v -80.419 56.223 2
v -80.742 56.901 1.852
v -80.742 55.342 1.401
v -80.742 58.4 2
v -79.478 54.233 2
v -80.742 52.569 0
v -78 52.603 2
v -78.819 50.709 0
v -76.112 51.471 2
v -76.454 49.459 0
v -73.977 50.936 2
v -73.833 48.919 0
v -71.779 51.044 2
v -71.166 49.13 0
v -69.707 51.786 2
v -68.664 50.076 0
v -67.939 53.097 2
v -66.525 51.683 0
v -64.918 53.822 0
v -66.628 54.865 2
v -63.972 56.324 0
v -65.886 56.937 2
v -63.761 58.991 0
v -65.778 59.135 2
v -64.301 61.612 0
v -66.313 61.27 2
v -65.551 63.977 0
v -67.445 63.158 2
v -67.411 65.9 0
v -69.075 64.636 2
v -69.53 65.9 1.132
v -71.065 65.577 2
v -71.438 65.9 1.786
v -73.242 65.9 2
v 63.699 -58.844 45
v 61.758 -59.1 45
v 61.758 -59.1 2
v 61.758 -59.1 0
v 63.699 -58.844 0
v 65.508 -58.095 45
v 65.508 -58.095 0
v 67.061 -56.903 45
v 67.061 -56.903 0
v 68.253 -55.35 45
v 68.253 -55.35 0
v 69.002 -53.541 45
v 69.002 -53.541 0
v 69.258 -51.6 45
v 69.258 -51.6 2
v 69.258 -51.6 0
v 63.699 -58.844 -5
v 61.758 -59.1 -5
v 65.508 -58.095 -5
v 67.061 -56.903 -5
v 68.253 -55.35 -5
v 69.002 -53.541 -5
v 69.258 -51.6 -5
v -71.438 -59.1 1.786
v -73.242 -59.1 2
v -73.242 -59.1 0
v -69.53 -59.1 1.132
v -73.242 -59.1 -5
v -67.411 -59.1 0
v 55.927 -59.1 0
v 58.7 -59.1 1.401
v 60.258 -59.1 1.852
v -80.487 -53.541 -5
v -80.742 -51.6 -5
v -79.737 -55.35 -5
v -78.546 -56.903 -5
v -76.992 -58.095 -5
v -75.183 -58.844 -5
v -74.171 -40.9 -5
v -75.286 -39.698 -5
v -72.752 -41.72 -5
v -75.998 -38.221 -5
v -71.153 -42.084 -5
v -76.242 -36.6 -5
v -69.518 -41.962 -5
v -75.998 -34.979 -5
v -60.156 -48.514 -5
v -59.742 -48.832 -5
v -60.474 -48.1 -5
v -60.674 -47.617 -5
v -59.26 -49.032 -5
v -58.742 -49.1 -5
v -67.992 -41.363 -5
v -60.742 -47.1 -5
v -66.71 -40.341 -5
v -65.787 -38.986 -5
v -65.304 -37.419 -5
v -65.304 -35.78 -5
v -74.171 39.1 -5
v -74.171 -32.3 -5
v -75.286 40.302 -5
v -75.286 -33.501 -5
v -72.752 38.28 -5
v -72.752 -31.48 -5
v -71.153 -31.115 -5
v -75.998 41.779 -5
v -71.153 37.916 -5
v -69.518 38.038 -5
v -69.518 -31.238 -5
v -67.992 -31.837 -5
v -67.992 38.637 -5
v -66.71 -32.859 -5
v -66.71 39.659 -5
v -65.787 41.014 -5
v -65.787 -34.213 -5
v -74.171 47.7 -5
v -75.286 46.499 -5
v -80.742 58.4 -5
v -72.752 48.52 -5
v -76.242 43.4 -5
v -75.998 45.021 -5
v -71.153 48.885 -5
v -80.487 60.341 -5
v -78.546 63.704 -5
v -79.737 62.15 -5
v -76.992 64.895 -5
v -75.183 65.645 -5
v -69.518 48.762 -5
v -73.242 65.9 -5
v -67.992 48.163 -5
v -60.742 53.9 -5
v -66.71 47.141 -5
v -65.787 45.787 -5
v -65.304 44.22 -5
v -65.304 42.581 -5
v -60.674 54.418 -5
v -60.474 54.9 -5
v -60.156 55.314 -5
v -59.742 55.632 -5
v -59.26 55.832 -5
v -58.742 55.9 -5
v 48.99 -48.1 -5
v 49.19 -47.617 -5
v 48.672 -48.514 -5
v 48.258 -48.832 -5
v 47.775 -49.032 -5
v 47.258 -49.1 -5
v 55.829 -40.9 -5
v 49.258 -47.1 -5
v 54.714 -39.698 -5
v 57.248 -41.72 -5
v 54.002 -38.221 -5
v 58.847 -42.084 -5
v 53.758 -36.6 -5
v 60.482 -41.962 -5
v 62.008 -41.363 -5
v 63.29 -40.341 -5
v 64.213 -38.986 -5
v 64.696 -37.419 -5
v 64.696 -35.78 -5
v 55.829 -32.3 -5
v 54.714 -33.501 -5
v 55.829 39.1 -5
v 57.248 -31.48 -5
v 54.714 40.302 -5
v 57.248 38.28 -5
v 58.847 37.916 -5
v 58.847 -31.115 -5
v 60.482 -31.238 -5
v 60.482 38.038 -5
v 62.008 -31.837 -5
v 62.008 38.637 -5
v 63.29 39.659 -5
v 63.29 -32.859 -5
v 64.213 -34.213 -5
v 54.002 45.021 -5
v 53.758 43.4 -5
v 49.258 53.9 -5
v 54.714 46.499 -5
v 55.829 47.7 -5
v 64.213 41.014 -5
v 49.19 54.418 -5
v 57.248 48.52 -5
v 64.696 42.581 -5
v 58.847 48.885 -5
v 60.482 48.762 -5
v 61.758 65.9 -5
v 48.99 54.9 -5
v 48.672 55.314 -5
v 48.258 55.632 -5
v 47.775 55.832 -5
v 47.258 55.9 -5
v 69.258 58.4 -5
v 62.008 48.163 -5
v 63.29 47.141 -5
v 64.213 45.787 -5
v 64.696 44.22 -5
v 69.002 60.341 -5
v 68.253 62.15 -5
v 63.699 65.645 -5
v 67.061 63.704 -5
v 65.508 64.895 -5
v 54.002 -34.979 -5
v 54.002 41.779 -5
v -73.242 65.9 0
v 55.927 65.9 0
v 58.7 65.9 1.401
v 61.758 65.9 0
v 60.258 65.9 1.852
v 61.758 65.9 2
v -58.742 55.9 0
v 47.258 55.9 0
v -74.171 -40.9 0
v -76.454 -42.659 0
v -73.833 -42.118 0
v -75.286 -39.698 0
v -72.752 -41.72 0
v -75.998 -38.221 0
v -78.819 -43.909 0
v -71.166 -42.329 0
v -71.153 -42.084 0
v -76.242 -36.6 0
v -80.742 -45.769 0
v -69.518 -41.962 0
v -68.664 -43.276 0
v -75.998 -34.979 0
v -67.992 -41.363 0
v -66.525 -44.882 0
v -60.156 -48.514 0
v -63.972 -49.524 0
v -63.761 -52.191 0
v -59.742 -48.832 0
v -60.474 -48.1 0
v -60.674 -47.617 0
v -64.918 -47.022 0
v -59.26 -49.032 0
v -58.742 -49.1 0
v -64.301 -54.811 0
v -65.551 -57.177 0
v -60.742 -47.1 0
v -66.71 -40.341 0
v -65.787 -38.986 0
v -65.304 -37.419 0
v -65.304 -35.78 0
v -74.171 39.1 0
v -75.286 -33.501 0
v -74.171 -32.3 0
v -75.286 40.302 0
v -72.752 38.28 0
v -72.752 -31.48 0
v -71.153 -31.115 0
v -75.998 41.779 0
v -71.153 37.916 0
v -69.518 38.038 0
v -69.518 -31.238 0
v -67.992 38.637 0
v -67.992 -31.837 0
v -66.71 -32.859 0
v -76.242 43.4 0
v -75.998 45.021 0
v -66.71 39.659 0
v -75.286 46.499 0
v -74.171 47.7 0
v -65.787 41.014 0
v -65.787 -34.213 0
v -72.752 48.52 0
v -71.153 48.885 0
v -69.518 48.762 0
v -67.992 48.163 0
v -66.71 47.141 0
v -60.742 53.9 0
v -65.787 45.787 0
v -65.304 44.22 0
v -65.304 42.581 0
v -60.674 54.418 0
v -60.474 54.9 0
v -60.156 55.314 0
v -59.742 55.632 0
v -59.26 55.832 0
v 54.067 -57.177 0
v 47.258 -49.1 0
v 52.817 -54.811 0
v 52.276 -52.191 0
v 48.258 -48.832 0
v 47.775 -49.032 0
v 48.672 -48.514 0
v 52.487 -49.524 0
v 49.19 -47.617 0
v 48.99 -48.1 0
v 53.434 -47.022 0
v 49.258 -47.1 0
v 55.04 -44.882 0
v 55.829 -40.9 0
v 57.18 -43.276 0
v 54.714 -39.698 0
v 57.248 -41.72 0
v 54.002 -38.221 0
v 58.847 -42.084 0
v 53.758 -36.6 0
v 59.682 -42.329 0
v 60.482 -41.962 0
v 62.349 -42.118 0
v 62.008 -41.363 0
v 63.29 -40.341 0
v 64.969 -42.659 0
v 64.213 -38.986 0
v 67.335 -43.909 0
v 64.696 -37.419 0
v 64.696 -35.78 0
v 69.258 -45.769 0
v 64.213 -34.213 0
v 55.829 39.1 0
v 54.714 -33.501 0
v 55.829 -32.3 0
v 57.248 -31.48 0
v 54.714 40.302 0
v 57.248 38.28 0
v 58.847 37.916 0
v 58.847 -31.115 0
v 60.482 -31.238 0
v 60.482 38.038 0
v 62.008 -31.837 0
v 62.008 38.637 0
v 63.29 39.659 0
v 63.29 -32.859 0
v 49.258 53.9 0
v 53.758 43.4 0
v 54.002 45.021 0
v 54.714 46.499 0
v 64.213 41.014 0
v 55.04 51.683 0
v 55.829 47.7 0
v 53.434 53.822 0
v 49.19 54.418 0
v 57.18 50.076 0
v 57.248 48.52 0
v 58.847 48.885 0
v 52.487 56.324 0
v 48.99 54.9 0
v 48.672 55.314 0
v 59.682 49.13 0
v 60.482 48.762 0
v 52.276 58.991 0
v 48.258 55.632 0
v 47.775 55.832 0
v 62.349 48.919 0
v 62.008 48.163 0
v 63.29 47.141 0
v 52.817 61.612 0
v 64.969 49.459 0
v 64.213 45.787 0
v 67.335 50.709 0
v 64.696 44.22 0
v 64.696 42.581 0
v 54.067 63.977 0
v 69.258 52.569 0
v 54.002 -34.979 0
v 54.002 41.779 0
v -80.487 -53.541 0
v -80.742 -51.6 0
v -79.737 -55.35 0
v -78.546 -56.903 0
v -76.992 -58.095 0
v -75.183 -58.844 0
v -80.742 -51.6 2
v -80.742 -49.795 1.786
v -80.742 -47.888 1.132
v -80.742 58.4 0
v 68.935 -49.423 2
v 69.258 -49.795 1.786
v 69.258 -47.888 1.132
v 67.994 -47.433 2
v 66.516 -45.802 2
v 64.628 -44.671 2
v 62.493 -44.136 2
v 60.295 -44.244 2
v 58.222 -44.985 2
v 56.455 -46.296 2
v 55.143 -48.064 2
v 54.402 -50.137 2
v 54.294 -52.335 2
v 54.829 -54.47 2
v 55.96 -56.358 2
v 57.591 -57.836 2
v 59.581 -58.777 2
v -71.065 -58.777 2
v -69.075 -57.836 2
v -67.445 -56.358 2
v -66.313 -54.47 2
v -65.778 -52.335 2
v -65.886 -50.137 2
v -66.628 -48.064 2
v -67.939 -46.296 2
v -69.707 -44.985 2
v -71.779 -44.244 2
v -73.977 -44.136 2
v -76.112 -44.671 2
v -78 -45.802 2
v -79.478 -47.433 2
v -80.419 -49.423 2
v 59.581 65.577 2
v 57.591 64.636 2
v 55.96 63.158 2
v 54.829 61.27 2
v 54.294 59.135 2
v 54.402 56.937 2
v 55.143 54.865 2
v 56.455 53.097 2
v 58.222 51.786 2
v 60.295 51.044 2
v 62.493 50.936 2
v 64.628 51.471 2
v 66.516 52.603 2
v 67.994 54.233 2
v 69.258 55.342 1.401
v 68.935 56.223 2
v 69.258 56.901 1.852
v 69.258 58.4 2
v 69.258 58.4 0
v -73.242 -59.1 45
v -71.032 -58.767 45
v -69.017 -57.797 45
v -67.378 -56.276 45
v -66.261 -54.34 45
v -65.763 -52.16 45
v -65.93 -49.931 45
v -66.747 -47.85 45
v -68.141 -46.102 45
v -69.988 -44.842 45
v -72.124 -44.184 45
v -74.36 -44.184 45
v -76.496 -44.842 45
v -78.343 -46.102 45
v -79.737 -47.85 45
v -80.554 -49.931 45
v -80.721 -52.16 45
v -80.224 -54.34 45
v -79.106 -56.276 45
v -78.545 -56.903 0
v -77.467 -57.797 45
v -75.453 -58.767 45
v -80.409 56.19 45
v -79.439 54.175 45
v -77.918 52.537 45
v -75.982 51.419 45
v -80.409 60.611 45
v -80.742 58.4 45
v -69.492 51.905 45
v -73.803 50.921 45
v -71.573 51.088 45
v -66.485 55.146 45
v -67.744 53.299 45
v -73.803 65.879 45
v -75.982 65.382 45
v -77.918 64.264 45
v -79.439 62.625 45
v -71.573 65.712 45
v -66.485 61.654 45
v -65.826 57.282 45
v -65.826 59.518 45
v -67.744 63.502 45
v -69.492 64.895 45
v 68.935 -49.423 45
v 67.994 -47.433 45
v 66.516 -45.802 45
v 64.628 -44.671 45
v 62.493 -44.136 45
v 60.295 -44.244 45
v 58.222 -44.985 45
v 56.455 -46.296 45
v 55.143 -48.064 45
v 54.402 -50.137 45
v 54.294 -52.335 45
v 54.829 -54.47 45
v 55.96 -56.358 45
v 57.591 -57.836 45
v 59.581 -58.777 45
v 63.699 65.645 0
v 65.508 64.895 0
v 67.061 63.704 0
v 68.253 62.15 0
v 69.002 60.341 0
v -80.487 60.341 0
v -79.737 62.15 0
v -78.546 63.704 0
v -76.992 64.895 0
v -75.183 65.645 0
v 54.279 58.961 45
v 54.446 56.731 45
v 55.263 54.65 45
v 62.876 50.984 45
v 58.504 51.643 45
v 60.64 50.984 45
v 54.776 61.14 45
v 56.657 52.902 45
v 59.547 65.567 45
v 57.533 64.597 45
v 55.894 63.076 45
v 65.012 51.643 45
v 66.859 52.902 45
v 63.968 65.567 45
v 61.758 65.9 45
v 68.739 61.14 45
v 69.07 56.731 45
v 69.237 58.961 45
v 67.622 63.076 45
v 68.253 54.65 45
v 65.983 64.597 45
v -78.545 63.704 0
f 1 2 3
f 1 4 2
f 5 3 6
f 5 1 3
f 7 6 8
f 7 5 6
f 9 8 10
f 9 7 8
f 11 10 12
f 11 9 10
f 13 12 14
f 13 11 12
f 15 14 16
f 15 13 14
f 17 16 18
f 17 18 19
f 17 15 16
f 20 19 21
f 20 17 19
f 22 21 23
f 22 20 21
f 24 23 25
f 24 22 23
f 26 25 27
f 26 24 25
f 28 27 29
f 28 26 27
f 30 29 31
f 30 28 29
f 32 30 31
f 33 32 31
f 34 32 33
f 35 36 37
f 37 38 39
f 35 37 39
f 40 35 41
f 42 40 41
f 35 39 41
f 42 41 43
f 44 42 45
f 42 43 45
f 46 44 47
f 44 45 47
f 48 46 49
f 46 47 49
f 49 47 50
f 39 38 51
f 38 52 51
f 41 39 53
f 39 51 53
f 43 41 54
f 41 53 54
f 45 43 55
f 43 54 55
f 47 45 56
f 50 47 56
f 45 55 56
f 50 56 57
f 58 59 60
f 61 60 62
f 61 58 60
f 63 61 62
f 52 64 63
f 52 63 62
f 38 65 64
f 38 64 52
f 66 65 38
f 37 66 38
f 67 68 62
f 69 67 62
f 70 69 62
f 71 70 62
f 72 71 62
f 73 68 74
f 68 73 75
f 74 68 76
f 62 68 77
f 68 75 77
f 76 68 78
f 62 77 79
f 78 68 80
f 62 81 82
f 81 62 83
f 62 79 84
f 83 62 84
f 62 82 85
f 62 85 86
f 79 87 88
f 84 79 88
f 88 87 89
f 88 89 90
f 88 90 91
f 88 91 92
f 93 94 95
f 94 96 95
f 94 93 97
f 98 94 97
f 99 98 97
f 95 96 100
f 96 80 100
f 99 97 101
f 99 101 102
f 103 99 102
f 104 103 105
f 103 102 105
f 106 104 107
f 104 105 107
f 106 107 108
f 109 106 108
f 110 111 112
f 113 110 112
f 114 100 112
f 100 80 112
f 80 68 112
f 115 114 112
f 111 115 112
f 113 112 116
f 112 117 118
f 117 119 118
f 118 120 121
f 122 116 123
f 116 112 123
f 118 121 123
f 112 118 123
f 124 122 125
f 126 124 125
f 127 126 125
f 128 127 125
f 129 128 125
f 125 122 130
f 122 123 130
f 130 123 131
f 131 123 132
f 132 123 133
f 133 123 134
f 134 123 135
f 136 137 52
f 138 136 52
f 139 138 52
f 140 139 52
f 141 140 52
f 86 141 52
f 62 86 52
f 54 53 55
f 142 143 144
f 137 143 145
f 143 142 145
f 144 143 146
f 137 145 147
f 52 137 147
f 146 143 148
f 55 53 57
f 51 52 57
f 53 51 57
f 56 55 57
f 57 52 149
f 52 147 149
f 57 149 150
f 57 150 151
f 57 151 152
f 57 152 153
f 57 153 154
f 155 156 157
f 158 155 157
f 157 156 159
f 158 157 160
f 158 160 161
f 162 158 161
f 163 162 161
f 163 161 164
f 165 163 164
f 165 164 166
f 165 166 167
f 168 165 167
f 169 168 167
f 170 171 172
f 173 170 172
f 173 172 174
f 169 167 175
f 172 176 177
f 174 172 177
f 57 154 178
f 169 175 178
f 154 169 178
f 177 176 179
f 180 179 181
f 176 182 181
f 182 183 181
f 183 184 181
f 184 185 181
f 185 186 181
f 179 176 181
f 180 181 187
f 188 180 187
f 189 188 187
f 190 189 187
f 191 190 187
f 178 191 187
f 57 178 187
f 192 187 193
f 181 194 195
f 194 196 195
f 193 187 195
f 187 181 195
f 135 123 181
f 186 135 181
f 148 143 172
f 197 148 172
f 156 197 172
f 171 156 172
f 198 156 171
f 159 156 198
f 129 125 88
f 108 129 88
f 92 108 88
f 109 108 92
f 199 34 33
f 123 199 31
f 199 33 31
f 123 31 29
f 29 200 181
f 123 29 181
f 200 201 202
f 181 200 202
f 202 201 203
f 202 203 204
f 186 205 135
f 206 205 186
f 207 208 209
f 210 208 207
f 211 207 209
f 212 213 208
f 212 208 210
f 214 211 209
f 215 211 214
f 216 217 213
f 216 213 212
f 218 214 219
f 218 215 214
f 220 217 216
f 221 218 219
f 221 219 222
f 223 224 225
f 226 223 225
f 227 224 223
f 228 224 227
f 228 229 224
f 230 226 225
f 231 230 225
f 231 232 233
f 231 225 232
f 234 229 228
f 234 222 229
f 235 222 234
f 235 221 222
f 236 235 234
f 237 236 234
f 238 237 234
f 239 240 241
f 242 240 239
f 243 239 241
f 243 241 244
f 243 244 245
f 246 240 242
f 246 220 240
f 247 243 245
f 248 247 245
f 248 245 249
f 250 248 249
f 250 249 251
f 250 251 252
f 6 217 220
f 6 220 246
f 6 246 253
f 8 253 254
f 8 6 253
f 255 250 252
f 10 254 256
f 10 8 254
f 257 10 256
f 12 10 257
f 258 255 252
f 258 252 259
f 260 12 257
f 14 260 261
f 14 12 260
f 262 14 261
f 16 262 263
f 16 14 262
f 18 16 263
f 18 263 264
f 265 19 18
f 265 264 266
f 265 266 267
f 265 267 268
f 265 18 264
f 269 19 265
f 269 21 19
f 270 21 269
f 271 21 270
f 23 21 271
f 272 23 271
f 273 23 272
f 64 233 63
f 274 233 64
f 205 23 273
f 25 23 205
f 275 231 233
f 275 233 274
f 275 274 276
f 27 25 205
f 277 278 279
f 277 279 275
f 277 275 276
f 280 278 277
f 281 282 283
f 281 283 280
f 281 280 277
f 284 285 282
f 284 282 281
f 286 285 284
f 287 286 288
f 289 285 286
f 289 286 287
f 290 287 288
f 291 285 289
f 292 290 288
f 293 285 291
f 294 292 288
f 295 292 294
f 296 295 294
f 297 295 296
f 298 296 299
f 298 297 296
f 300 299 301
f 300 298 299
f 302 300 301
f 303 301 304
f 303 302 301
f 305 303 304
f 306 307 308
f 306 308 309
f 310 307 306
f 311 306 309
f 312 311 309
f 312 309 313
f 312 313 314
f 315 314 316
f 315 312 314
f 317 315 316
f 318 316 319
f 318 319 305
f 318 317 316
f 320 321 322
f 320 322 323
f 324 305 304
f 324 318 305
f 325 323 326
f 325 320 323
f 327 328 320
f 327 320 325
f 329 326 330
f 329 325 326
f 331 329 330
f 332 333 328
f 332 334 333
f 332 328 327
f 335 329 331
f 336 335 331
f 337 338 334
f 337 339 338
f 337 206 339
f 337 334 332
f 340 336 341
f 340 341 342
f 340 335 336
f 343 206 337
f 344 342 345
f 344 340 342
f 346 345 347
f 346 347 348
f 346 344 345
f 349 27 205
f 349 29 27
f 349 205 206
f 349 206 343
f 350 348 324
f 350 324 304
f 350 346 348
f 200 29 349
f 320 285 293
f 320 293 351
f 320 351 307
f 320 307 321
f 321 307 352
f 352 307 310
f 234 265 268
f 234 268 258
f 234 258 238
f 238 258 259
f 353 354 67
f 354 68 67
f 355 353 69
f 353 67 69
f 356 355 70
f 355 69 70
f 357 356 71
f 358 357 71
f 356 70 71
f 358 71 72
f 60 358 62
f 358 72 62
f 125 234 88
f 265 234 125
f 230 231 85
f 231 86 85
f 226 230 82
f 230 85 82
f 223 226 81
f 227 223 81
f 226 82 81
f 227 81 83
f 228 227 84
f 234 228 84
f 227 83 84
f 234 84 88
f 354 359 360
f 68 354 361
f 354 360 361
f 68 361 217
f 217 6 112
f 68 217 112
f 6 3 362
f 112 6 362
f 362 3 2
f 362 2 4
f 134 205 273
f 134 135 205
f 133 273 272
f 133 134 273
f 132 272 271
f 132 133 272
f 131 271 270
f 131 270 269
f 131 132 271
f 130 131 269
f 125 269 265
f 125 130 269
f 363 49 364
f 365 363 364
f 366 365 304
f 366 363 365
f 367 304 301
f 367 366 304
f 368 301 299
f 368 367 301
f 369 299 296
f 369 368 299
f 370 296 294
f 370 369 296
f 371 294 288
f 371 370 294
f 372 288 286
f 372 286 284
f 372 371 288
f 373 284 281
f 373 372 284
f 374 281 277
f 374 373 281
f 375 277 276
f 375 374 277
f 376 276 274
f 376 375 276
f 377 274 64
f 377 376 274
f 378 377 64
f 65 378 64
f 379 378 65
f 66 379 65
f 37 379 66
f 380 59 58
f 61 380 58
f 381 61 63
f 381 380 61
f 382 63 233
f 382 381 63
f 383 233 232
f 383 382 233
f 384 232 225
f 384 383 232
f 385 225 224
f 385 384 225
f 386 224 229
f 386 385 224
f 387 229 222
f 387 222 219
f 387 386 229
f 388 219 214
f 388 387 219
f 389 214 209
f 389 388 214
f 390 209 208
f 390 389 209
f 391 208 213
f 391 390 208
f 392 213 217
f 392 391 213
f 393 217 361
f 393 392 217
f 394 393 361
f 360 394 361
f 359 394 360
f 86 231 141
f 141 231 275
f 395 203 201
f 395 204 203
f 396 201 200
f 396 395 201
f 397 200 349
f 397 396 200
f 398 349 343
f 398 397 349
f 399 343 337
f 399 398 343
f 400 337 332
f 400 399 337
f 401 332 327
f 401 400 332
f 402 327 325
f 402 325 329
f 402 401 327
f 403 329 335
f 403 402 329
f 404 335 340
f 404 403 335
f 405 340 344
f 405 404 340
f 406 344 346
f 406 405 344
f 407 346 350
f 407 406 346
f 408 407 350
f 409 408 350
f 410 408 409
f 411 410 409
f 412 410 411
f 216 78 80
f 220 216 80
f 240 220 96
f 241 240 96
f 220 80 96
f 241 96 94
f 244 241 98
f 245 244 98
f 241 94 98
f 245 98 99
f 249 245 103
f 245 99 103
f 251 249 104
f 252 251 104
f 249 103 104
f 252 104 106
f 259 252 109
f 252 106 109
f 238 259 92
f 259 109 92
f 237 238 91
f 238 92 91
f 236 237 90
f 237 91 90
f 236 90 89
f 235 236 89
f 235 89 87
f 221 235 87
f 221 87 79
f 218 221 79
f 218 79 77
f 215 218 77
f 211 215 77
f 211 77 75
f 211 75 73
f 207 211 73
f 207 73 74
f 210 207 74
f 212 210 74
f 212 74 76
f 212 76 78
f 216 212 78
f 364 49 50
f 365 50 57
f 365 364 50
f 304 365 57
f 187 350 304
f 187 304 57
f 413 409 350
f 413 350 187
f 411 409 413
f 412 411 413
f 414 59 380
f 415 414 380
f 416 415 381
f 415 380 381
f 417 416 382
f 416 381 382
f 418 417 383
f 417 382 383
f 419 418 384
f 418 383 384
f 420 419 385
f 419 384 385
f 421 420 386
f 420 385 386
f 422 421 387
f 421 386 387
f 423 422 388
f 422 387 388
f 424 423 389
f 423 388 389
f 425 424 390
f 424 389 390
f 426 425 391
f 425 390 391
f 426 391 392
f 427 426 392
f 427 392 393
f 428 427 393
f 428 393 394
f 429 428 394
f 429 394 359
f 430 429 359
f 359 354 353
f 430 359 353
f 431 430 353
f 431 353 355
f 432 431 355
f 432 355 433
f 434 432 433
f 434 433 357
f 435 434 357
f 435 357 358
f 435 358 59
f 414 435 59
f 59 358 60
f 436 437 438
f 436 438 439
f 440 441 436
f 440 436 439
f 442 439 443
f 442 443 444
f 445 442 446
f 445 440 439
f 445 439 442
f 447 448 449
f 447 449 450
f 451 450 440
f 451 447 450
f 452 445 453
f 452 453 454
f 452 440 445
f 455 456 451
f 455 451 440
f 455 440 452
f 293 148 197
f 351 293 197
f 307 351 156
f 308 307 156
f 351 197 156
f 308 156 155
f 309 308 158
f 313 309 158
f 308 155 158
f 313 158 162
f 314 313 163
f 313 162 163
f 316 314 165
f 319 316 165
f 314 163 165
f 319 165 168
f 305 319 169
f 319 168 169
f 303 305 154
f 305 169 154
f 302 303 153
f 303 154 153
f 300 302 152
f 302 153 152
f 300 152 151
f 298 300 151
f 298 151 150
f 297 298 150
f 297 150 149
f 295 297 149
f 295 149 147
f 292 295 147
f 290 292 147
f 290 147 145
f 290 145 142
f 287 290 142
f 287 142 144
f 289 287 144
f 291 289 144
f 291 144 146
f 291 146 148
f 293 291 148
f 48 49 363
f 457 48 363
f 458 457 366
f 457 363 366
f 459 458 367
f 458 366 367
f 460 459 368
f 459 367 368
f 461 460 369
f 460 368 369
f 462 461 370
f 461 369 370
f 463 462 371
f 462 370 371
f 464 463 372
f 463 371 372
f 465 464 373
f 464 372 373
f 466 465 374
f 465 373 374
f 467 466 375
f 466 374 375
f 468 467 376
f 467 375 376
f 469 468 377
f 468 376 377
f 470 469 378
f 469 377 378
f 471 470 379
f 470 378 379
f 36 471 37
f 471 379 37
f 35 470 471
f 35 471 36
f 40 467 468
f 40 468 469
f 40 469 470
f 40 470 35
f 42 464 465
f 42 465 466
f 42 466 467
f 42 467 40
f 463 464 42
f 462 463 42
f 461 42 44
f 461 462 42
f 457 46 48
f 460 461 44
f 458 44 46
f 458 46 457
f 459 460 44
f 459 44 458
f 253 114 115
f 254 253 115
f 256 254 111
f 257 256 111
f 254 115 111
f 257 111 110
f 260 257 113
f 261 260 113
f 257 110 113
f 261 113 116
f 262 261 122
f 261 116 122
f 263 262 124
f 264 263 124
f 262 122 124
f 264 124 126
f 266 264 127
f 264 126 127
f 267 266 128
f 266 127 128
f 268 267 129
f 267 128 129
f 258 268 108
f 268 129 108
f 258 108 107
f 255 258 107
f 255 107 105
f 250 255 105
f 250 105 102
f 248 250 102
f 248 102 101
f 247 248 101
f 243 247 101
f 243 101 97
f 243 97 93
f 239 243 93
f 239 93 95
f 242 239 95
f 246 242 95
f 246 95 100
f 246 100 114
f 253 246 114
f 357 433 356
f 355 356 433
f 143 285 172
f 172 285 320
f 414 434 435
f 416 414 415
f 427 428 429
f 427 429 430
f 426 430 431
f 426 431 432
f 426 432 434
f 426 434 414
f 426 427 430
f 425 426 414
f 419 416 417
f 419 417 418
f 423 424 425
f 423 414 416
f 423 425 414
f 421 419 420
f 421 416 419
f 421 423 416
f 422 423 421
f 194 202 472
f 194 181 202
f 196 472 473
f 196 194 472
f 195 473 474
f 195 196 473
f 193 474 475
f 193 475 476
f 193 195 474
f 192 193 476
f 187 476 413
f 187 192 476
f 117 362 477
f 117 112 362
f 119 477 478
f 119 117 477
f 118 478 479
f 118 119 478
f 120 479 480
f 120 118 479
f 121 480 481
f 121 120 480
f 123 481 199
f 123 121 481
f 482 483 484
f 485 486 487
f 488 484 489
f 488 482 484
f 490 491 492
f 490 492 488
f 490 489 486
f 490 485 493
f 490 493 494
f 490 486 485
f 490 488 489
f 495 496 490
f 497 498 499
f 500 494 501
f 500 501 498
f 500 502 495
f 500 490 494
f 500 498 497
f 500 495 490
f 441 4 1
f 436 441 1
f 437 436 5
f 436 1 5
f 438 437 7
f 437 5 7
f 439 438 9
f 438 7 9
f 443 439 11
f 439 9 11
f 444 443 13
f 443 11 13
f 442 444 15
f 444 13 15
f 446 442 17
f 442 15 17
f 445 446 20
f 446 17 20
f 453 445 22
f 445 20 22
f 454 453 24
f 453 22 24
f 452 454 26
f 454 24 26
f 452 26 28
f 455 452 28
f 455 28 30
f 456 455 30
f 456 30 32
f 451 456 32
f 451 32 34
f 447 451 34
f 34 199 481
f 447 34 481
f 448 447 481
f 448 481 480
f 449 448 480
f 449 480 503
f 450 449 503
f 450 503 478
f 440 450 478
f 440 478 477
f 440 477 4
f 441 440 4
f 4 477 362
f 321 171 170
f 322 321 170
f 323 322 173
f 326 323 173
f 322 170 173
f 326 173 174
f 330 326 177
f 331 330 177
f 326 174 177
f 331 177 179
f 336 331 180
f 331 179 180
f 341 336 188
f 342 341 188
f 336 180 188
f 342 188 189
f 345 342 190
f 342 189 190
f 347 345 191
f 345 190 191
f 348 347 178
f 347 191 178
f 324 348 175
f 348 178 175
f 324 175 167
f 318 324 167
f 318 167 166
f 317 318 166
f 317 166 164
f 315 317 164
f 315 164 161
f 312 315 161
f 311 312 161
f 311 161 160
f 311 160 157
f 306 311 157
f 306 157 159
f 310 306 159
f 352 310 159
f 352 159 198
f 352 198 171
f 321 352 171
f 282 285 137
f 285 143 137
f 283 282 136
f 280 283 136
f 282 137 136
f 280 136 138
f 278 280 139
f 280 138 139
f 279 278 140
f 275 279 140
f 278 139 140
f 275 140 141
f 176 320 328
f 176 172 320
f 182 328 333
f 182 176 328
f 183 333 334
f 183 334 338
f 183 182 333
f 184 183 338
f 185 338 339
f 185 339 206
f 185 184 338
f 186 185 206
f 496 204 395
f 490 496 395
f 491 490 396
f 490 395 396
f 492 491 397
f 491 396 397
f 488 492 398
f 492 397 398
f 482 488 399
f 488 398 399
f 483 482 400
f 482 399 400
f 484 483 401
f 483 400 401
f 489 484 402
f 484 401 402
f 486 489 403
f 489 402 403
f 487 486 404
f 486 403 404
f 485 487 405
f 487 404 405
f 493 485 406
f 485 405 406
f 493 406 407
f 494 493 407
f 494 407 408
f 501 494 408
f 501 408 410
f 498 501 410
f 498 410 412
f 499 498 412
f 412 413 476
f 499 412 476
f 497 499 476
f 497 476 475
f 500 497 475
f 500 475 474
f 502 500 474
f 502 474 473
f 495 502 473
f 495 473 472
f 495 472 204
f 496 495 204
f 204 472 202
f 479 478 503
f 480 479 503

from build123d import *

# Parameters (mm, degrees)
F0_W         = 110
F0_H         = 105
F1_DEPTH     = 5
F2_DEPTH     = 45
F3_D         = 11
F4_R         = 7.4999
F5_R         = 2
F6_T4_ANGLE  = 270.0000001091
F6_T10_ANGLE = 270
F6_T16_ANGLE = 269.9999994391
F6_T22_ANGLE = 270


# Not quite as in the source:
# - a fillet or chamfer that OpenCascade refuses, or shapes differently, is made with other operations: its cross-section is extruded or revolved along the edge and cut away or added
# - a fillet or chamfer is up to 0.001 mm smaller than in the source, because OpenCascade refuses the exact size


with BuildPart() as f1:
    # F0 (on Top) → F1 (new body)
    with BuildSketch(Plane.XY):
        with BuildLine():
            Line((-73.2421757894, 65.9002404553), (-80.7421757894, 65.9002404553))
            Line((-80.7421757894, 65.9002404553), (-80.7421757894, 58.4002404553))
            ThreePointArc((-80.7421757894, 58.4002404553), (-78.5454766483, 63.7035413142), (-73.2421757894, 65.9002404553))
        make_face()
        with BuildLine():
            Line((61.7578242249, 65.9002404553), (-73.2421757894, 65.9002404553))
            ThreePointArc((-73.2421757894, 65.9002404553), (-67.9388749305, 63.7035413142), (-65.7421757894, 58.4002404553))
            ThreePointArc((-65.7421757894, 58.4002404553), (-73.2421757894, 50.9002404553), (-80.7421757894, 58.4002404553))
            Line((-80.7421757894, 58.4002404553), (-80.7421757894, -51.5997595447))
            ThreePointArc((-80.7421757894, -51.5997595447), (-73.2421757894, -44.0997595447), (-65.7421757894, -51.5997595447))
            ThreePointArc((-65.7421757894, -51.5997595447), (-67.9388749305, -56.9030604036), (-73.2421757894, -59.0997595447))
            Line((-73.2421757894, -59.0997595447), (61.757824248, -59.0997595447))
            ThreePointArc((61.757824248, -59.0997595447), (56.4545233385, -46.296458699), (69.2578242106, -51.5997595447))
            Line((69.2578242106, -51.5997595447), (69.2578242106, 58.4002404553))
            ThreePointArc((69.2578242106, 58.4002404553), (56.4545233466, 53.0969396015), (61.7578242249, 65.9002404553))
        make_face()
        with Locations((-5.7421757894, 3.4002404553)):
            Rectangle(F0_W, F0_H, mode=Mode.SUBTRACT)
        with BuildLine():
            Line((69.2578242106, 65.9002404553), (61.7578242249, 65.9002404553))
            ThreePointArc((61.7578242249, 65.9002404553), (67.0611250745, 63.7035413092), (69.2578242106, 58.4002404553))
            Line((69.2578242106, 58.4002404553), (69.2578242106, 65.9002404553))
        make_face()
        with BuildLine():
            ThreePointArc((61.757824248, -59.0997595447), (67.0611250827, -56.9030603903), (69.2578242106, -51.5997595447))
            ThreePointArc((69.2578242106, -51.5997595447), (56.4545233385, -46.296458699), (61.757824248, -59.0997595447))
        make_face()
        with BuildLine():
            ThreePointArc((-65.7421757894, -51.5997595447), (-73.2421757894, -44.0997595447), (-80.7421757894, -51.5997595447))
            ThreePointArc((-80.7421757894, -51.5997595447), (-78.5454766483, -56.9030604036), (-73.2421757894, -59.0997595447))
            ThreePointArc((-73.2421757894, -59.0997595447), (-67.9388749305, -56.9030604036), (-65.7421757894, -51.5997595447))
        make_face()
        with BuildLine():
            ThreePointArc((69.2578242106, 58.4002404553), (67.0611250745, 63.7035413092), (61.7578242249, 65.9002404553))
            ThreePointArc((61.7578242249, 65.9002404553), (56.4545233466, 53.0969396015), (69.2578242106, 58.4002404553))
        make_face()
        with BuildLine():
            ThreePointArc((-65.7421757894, 58.4002404553), (-67.9388749305, 63.7035413142), (-73.2421757894, 65.9002404553))
            ThreePointArc((-73.2421757894, 65.9002404553), (-78.5454766483, 63.7035413142), (-80.7421757894, 58.4002404553))
            ThreePointArc((-80.7421757894, 58.4002404553), (-73.2421757894, 50.9002404553), (-65.7421757894, 58.4002404553))
        make_face()
        with BuildLine():
            ThreePointArc((-73.2421757894, -59.0997595447), (-78.5454766483, -56.9030604036), (-80.7421757894, -51.5997595447))
            Line((-80.7421757894, -51.5997595447), (-80.7421757894, -59.0997595447))
            Line((-80.7421757894, -59.0997595447), (-73.2421757894, -59.0997595447))
        make_face()
        with BuildLine():
            Line((69.2578242106, -59.0997595447), (69.2578242106, -51.5997595447))
            ThreePointArc((69.2578242106, -51.5997595447), (67.0611250827, -56.9030603903), (61.757824248, -59.0997595447))
            Line((61.757824248, -59.0997595447), (69.2578242106, -59.0997595447))
        make_face()
    extrude(amount=-F1_DEPTH)

    # F0 (on Top) → F2 (join)
    with BuildSketch(Plane.XY):
        with BuildLine():
            ThreePointArc((61.757824248, -59.0997595447), (67.0611250827, -56.9030603903), (69.2578242106, -51.5997595447))
            ThreePointArc((69.2578242106, -51.5997595447), (56.4545233385, -46.296458699), (61.757824248, -59.0997595447))
        make_face()
        with BuildLine():
            ThreePointArc((69.2578242106, 58.4002404553), (67.0611250745, 63.7035413092), (61.7578242249, 65.9002404553))
            ThreePointArc((61.7578242249, 65.9002404553), (56.4545233466, 53.0969396015), (69.2578242106, 58.4002404553))
        make_face()
        with BuildLine():
            ThreePointArc((-65.7421757894, -51.5997595447), (-73.2421757894, -44.0997595447), (-80.7421757894, -51.5997595447))
            ThreePointArc((-80.7421757894, -51.5997595447), (-78.5454766483, -56.9030604036), (-73.2421757894, -59.0997595447))
            ThreePointArc((-73.2421757894, -59.0997595447), (-67.9388749305, -56.9030604036), (-65.7421757894, -51.5997595447))
        make_face()
        with BuildLine():
            ThreePointArc((-65.7421757894, 58.4002404553), (-67.9388749305, 63.7035413142), (-73.2421757894, 65.9002404553))
            ThreePointArc((-73.2421757894, 65.9002404553), (-78.5454766483, 63.7035413142), (-80.7421757894, 58.4002404553))
            ThreePointArc((-80.7421757894, 58.4002404553), (-73.2421757894, 50.9002404553), (-65.7421757894, 58.4002404553))
        make_face()
    extrude(amount=F2_DEPTH)

    # F3 (through all)
    with Locations(Plane.XY):
        with Locations((-70.7421757894, 43.4002404553), (-70.7421757894, -36.5997595447), (59.2578242106, 43.4002404553), (59.2578242106, -36.5997595447)):
            Hole(F3_D / 2)

    # F4 (radius 7.5 in the source; OpenCascade refuses exactly that, so slightly less here)
    f4_edges = [f1.edges().sort_by_distance(p)[0] for p in [
        (69.257824, 65.90024, -2.5),
        (69.257824, -59.09976, -2.5),
        (-80.742176, -59.09976, -2.5),
        (-80.742176, 65.90024, -2.5),
    ]]
    fillet(f4_edges, radius=F4_R)

    # F5
    f5_edges = [f1.edges().sort_by_distance(p)[0] for p in [
        (-60.742176, 55.90024, -2.5),
        (49.257824, 55.90024, -2.5),
        (-60.742176, -49.09976, -2.5),
        (49.257824, -49.09976, -2.5),
    ]]
    fillet(f5_edges, radius=F5_R)

    # F6: chamfer of 2 on 4 edges, made by hand


with BuildPart() as f6_tool2:
    # F6_s3 → F6_t4 (revolve)
    with BuildSketch(Plane.YZ.offset(61.7578242106)):
        Polygon((67.9002404553, 0), (65.9002404553, 2), (65.9002404553, 0), align=None)
    revolve(axis=Axis((61.7578242106, 58.4002404553, 0), (0, 0, 1)), revolution_arc=F6_T4_ANGLE)

    split(bisect_by=Plane.XZ.offset(-65.9002404553), keep=Keep.TOP)

    split(bisect_by=Plane.YZ.offset(69.2578242106), keep=Keep.BOTTOM)


with BuildPart() as f1_1:
    add(f1.part)

    # F6_t1: union F6_tool2
    add(f6_tool2.part)


with BuildPart() as f6_tool8:
    # F6_s9 → F6_t10 (revolve)
    with BuildSketch(Plane.XZ.offset(-58.4002404553)):
        Polygon((-82.7421757894, 0), (-80.7421757894, 2), (-80.7421757894, 0), align=None)
    revolve(axis=Axis((-73.2421757894, 58.4002404553, 0), (0, 0, 1)), revolution_arc=F6_T10_ANGLE)

    split(bisect_by=Plane.YZ.offset(-80.7421757894), keep=Keep.TOP)

    split(bisect_by=Plane.XZ.offset(-65.9002404553), keep=Keep.TOP)


with BuildPart() as f1_2:
    add(f1_1.part)

    # F6_t7: union F6_tool8
    add(f6_tool8.part)


with BuildPart() as f6_tool14:
    # F6_s15 → F6_t16 (revolve)
    with BuildSketch(Plane.XZ.offset(51.5997595447)):
        Polygon((71.2578242106, 0), (69.2578242106, 2), (69.2578242106, 0), align=None)
    revolve(axis=Axis((61.7578242106, -51.5997595447, 0), (0, 0, 1)), revolution_arc=F6_T16_ANGLE)

    split(bisect_by=Plane.XZ.offset(59.0997595447), keep=Keep.BOTTOM)

    split(bisect_by=Plane.YZ.offset(69.2578242106), keep=Keep.BOTTOM)


with BuildPart() as f1_3:
    add(f1_2.part)

    # F6_t13: union F6_tool14
    add(f6_tool14.part)


with BuildPart() as f6_tool20:
    # F6_s21 → F6_t22 (revolve)
    with BuildSketch(Plane.YZ.offset(-73.2421757894)):
        Polygon((-61.0997595447, 0), (-59.0997595447, 2), (-59.0997595447, 0), align=None)
    revolve(axis=Axis((-73.2421757894, -51.5997595447, 0), (0, 0, 1)), revolution_arc=F6_T22_ANGLE)

    split(bisect_by=Plane.YZ.offset(-80.7421757894), keep=Keep.TOP)

    split(bisect_by=Plane.XZ.offset(59.0997595447), keep=Keep.BOTTOM)


with BuildPart() as f1_4:
    add(f1_3.part)

    # F6_t19: union F6_tool20
    add(f6_tool20.part)


solid = f1_4.part
